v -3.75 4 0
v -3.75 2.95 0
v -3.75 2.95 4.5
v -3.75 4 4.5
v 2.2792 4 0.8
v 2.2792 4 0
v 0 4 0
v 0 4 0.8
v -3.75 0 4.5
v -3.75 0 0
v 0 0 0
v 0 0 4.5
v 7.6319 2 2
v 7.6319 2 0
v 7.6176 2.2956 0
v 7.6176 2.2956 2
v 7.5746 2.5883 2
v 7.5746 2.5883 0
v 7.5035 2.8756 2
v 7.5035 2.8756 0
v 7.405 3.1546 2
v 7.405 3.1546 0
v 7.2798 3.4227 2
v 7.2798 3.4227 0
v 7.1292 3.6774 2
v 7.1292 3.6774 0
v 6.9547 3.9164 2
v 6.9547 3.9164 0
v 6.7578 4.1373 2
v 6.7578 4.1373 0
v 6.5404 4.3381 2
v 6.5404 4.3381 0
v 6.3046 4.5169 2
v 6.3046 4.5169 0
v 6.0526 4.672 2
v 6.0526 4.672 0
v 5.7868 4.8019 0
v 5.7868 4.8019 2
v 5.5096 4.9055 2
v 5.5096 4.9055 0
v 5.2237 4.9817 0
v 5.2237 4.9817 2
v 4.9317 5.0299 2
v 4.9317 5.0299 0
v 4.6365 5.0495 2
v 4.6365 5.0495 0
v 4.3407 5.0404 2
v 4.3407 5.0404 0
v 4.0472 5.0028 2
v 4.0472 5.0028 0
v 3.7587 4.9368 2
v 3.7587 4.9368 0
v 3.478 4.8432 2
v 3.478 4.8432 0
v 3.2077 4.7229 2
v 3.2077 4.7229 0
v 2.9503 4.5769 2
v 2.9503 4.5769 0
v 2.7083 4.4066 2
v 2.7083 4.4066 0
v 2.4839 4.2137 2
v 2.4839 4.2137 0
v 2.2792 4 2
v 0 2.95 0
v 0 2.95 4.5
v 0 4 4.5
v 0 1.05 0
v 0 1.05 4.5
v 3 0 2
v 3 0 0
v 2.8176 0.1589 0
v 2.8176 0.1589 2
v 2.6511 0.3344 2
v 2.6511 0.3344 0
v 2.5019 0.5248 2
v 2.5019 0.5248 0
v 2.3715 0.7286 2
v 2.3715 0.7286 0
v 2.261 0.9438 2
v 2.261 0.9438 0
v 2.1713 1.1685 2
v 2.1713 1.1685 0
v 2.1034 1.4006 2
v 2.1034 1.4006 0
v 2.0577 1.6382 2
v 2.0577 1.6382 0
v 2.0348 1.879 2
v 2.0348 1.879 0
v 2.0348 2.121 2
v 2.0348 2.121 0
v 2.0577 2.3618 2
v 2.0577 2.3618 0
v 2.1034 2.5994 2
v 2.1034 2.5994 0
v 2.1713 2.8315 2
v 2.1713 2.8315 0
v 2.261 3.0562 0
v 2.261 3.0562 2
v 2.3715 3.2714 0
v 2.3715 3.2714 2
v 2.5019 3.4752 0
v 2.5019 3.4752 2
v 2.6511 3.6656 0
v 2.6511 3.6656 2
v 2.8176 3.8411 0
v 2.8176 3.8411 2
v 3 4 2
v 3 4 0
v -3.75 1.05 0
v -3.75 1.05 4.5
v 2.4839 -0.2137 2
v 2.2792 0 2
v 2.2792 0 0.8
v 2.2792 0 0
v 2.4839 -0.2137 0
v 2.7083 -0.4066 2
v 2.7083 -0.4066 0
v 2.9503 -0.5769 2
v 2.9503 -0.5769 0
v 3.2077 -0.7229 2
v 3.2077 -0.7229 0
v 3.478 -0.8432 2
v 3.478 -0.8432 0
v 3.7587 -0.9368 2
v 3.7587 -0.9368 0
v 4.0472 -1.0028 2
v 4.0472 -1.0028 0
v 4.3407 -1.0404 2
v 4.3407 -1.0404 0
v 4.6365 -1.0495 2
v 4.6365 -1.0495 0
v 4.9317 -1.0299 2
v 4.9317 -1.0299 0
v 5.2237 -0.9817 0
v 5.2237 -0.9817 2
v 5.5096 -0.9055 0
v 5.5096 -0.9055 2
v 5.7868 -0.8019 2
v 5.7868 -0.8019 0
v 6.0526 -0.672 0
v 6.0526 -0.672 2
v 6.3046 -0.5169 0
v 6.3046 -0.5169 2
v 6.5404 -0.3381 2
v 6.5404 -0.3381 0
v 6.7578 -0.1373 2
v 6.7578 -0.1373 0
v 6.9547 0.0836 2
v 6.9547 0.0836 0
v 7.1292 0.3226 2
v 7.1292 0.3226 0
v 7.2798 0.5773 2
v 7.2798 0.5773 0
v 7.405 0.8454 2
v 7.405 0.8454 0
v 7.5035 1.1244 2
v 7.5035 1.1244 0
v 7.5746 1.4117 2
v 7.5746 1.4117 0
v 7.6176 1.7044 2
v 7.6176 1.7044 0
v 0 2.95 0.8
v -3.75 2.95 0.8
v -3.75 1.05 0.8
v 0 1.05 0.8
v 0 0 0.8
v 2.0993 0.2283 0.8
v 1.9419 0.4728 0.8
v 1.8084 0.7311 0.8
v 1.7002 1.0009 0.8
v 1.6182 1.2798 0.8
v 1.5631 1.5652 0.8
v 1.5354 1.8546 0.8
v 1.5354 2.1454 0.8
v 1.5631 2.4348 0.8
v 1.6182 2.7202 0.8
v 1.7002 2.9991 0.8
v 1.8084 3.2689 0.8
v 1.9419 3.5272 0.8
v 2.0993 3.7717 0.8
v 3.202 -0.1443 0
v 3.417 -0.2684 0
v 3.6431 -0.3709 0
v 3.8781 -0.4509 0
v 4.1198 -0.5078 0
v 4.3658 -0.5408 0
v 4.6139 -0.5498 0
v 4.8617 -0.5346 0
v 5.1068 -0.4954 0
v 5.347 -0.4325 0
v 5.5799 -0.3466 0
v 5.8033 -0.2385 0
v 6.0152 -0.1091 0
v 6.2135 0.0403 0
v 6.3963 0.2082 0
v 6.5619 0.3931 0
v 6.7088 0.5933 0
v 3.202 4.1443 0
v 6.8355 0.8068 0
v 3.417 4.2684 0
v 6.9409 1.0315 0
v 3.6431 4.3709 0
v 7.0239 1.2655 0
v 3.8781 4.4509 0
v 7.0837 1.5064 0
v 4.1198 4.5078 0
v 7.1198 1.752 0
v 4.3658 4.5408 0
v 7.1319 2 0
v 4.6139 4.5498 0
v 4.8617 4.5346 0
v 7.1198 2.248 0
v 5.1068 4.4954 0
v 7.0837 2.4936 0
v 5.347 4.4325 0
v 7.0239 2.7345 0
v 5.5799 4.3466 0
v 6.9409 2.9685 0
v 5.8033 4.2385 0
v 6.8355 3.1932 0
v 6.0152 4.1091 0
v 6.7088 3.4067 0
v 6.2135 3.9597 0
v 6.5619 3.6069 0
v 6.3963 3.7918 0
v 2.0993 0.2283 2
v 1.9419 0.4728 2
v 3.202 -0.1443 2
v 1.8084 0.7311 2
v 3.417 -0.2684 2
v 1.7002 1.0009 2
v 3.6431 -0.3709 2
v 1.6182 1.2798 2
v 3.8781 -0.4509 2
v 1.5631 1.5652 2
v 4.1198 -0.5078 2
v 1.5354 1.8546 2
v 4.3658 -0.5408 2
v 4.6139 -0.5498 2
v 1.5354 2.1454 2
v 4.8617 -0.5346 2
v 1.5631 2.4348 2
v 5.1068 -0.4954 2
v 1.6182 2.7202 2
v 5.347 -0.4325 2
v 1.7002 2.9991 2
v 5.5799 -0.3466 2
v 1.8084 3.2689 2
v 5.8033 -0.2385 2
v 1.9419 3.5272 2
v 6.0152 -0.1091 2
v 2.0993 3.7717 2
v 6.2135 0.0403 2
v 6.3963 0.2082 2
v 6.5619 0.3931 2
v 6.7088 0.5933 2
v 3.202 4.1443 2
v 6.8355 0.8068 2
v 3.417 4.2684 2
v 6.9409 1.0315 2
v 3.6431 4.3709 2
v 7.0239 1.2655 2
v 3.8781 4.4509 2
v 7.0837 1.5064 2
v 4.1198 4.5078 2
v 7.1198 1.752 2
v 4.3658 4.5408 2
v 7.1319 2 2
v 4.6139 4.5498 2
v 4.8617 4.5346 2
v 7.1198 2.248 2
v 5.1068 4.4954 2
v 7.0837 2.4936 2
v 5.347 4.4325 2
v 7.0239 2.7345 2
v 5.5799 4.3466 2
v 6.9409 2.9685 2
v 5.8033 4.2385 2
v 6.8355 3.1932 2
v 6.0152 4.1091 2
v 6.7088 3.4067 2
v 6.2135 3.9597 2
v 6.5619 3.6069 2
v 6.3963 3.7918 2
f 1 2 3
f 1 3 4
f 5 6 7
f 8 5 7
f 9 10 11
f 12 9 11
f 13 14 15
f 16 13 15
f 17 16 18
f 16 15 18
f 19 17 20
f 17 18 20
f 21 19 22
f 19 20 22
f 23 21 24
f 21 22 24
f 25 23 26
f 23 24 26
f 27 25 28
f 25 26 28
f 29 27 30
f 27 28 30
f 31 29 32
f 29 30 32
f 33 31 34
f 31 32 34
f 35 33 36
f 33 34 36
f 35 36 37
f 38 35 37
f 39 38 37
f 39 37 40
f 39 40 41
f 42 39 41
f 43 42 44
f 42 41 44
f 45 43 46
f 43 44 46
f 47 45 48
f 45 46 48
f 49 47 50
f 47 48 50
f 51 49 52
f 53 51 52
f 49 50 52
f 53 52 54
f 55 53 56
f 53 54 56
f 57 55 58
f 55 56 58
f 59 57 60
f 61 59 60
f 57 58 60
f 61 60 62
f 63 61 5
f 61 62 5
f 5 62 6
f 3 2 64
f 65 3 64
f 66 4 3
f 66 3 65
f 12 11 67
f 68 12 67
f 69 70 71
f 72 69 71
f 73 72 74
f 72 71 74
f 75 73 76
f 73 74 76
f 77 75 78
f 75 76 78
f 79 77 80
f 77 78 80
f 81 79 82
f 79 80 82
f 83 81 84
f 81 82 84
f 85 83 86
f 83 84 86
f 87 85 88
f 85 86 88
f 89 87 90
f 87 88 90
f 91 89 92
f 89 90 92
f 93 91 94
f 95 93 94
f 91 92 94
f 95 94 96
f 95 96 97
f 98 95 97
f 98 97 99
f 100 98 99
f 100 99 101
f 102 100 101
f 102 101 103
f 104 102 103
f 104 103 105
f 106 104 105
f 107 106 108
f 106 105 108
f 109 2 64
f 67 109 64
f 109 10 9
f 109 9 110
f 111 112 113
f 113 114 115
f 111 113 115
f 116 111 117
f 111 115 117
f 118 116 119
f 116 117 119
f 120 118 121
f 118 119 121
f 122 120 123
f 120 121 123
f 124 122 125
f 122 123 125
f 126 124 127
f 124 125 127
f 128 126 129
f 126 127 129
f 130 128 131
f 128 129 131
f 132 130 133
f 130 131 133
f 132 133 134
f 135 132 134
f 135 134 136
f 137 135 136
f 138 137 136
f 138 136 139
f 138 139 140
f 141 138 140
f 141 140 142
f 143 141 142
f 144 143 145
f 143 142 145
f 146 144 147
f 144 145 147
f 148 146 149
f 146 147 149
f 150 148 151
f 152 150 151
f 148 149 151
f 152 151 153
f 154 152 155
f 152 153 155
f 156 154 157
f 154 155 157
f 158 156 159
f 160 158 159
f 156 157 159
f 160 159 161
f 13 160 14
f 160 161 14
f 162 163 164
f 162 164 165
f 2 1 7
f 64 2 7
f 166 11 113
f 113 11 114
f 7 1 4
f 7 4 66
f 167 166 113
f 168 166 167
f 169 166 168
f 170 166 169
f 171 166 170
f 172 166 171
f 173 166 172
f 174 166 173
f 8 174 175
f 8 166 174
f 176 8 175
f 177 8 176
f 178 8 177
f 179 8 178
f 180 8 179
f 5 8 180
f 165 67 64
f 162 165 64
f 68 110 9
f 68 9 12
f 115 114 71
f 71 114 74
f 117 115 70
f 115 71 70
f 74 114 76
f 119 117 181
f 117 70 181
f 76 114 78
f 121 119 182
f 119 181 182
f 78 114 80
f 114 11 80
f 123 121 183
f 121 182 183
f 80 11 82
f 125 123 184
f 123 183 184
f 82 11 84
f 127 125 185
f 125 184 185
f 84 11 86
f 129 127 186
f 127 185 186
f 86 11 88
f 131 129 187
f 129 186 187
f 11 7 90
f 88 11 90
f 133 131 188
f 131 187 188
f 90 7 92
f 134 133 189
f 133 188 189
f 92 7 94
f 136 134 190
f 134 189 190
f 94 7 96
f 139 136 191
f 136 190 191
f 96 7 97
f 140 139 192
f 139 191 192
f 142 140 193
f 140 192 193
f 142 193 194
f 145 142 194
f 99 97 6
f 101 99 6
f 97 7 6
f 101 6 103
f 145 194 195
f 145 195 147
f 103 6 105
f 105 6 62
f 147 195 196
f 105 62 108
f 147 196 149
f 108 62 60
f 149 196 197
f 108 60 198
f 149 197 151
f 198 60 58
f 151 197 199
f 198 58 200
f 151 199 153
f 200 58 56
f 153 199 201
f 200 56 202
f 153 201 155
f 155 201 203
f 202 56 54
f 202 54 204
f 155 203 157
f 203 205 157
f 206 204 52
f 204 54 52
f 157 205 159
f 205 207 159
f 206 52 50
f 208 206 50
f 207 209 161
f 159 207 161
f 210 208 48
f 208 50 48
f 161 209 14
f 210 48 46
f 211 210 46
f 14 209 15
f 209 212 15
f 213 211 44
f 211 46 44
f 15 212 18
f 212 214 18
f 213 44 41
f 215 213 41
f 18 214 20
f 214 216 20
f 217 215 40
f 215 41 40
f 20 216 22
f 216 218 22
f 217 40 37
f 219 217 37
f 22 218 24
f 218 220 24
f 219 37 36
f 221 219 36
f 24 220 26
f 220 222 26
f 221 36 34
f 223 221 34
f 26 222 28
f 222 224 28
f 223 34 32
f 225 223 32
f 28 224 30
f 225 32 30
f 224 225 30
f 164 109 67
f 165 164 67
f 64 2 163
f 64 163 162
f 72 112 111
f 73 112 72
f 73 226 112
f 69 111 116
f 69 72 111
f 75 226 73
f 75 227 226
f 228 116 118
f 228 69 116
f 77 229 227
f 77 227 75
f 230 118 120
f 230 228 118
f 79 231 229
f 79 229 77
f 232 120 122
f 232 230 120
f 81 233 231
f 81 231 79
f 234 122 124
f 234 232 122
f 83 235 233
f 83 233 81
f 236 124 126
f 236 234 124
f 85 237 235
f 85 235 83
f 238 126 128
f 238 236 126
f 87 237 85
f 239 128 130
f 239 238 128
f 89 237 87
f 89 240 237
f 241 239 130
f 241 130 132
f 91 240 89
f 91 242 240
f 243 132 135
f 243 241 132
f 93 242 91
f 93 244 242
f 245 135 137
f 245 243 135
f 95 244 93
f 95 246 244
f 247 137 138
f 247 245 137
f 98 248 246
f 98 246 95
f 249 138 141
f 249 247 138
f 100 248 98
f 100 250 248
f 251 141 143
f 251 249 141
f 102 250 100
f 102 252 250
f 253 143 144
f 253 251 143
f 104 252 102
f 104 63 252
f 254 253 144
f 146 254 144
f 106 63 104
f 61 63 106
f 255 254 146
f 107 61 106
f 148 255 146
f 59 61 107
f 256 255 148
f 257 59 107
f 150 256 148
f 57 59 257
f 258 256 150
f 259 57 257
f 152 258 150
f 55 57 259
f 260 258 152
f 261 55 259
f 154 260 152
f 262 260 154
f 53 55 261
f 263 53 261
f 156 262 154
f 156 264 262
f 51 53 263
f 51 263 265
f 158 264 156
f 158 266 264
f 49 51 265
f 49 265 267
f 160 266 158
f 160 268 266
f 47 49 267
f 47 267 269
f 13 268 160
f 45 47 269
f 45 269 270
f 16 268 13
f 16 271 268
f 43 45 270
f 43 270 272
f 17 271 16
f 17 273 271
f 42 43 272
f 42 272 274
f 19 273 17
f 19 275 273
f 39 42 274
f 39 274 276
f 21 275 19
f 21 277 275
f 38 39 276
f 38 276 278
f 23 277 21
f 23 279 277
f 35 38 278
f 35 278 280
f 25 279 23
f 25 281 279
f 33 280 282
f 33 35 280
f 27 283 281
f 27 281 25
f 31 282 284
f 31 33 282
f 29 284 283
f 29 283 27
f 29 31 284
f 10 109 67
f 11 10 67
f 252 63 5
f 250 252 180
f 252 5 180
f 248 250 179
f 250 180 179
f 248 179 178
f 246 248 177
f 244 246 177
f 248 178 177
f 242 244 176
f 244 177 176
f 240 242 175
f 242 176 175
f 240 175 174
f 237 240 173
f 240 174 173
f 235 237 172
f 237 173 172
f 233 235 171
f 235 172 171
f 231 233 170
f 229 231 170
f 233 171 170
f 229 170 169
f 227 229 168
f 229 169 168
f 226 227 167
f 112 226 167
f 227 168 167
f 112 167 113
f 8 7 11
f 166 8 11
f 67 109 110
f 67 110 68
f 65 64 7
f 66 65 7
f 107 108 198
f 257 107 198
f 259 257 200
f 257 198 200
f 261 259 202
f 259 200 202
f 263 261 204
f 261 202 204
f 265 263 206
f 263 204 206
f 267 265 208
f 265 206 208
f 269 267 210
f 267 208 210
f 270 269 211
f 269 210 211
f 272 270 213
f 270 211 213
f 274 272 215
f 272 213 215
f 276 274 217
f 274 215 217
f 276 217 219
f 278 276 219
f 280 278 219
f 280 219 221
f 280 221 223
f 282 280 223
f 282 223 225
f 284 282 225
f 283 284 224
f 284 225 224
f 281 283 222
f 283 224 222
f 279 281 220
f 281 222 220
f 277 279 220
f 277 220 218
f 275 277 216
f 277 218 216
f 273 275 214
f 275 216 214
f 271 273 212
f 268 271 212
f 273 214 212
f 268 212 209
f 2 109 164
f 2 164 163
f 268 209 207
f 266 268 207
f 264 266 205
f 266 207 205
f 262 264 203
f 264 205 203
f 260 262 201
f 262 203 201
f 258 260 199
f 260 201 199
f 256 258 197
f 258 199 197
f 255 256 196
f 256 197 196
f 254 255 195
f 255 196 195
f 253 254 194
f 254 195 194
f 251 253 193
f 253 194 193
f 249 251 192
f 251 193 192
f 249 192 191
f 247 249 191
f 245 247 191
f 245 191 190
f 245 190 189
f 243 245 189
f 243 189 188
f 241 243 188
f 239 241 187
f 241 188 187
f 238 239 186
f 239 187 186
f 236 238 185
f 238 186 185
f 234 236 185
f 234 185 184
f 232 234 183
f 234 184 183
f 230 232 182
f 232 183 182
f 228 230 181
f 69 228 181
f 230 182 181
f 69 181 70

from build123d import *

# Parameters (mm, degrees)
F0_W     = 3.75
F0_H     = 1.05
F1_DEPTH = 4.5
F0_H_2   = 1.9
F2_DEPTH = 0.8
F3_DEPTH = 0.8
F4_DEPTH = 2


with BuildPart() as f1:
    # F0 (on Top) → F1 (new body)
    with BuildSketch(Plane.XY):
        with Locations((-1.875, 3.475)):
            Rectangle(F0_W, F0_H)
        with Locations((-1.875, 0.525)):
            Rectangle(F0_W, F0_H)
    extrude(amount=F1_DEPTH)


with BuildPart() as f2:
    # F0 (on Top) → F2 (new body)
    with BuildSketch(Plane.XY):
        with Locations((-1.875, 2)):
            Rectangle(F0_W, F0_H_2)
    extrude(amount=F2_DEPTH)


with BuildPart() as f3:
    # F0 (on Top) → F3 (new body)
    with BuildSketch(Plane.XY):
        with BuildLine():
            Line((0, 1.05), (0, 0))
            Line((0, 0), (2.279213, 0))
            ThreePointArc((2.279213, 0), (1.531929, 2), (2.279213, 4))
            Line((2.279213, 4), (0, 4))
            Line((0, 4), (0, 2.95))
            Line((0, 2.95), (0, 1.05))
        make_face()
    extrude(amount=F3_DEPTH)

    # F0 (on Top) → F4 (join)
    with BuildSketch(Plane.XY):
        with BuildLine():
            Line((3, 0), (2.279213, 0))
            ThreePointArc((2.279213, 0), (5.649454, -0.857077), (7.631929, 2))
            ThreePointArc((7.631929, 2), (5.649454, 4.857077), (2.279213, 4))
            Line((2.279213, 4), (3, 4))
            ThreePointArc((3, 4), (5.692915, 4.295258), (7.131929, 2))
            ThreePointArc((7.131929, 2), (5.692915, -0.295258), (3, 0))
        make_face()
        with BuildLine():
            ThreePointArc((2.279213, 4), (1.531929, 2), (2.279213, 0))
            Line((2.279213, 0), (3, 0))
            ThreePointArc((3, 0), (2.031929, 2), (3, 4))
            Line((3, 4), (2.279213, 4))
        make_face()
    extrude(amount=F4_DEPTH)


solid = Compound([f1.part, f2.part, f3.part])
